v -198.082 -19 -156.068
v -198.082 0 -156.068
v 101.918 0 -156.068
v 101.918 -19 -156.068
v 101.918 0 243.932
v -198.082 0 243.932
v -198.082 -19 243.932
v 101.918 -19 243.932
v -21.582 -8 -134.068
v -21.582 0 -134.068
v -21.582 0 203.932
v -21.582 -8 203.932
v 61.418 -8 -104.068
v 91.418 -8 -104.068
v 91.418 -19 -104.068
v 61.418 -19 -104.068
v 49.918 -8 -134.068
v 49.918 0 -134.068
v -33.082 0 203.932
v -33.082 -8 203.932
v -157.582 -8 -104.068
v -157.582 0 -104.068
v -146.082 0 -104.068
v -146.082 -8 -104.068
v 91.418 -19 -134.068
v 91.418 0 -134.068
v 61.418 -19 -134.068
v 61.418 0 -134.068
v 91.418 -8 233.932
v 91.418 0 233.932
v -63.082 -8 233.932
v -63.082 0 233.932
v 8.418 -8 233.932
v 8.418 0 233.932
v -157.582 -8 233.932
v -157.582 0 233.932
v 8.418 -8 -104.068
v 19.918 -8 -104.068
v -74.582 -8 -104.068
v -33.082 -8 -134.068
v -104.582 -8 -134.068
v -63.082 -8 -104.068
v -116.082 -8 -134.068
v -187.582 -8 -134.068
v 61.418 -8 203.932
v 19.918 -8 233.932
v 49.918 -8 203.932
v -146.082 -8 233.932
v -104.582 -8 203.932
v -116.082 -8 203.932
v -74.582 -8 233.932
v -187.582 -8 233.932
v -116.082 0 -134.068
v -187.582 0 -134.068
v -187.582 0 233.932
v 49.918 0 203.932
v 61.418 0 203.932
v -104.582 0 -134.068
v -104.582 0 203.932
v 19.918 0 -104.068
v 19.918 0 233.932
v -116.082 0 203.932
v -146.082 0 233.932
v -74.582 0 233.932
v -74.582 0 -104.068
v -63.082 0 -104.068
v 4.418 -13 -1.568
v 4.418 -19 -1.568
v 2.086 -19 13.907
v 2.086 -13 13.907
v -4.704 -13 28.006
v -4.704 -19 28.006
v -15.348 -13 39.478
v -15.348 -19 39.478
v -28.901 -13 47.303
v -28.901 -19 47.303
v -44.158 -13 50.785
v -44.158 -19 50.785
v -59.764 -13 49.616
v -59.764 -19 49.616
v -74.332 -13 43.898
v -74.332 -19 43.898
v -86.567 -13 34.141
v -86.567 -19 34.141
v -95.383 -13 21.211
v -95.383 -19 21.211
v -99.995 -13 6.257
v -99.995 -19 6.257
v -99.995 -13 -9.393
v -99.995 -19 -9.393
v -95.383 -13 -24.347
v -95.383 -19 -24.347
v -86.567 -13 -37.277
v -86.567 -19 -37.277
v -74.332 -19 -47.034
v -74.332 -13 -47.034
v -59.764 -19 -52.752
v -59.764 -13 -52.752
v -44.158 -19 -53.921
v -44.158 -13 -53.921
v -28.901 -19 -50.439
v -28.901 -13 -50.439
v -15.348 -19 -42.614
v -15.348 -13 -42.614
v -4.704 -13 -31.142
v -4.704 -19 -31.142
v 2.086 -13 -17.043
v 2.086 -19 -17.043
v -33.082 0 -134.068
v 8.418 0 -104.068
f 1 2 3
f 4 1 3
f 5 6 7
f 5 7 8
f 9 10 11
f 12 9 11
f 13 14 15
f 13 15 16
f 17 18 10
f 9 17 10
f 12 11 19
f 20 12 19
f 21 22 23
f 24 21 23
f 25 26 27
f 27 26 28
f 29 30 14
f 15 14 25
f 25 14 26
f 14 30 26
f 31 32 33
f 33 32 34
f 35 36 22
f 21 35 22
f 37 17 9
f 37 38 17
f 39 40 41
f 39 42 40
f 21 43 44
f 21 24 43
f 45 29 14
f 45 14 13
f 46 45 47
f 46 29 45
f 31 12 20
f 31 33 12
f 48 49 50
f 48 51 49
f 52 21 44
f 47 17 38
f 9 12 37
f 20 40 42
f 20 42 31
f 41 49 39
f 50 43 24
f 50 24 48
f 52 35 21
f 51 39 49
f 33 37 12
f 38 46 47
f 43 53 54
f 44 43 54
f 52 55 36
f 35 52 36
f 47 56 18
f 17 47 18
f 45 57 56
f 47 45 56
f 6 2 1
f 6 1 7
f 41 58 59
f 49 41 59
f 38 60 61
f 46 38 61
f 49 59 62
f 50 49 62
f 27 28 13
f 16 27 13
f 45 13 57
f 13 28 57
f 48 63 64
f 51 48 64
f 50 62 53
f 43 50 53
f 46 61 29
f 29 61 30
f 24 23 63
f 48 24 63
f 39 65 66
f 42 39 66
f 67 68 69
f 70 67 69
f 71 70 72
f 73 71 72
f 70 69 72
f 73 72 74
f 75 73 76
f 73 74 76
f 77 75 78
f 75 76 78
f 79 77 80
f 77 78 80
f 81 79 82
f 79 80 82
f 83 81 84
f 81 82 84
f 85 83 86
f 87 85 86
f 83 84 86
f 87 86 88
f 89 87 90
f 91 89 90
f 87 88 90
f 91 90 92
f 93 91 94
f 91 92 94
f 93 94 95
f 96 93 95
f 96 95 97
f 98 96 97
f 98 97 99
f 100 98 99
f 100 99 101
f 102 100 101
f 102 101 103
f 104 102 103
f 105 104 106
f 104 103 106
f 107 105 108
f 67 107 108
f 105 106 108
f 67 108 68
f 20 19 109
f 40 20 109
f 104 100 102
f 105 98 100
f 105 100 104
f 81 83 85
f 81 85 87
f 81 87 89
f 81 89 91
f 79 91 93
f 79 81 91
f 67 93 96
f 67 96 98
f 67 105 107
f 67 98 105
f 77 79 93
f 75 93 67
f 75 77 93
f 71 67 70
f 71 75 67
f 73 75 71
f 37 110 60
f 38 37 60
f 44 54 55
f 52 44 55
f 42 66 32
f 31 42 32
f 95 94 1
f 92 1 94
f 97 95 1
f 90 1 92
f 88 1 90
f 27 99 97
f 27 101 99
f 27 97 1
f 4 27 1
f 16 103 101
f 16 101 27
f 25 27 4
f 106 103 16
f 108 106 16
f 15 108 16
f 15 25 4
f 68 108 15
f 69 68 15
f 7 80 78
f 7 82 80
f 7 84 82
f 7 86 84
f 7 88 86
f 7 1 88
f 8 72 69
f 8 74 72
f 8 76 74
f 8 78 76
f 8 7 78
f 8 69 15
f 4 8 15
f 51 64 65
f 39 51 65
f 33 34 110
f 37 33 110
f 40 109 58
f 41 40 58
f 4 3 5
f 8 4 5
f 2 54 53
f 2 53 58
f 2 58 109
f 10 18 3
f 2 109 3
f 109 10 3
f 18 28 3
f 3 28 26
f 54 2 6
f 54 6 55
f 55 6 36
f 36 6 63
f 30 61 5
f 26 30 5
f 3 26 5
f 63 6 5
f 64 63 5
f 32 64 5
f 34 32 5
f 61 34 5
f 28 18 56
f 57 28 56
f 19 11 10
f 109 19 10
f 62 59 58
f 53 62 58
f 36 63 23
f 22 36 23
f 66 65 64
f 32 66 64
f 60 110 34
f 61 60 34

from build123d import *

# Parameters (mm, degrees)
F0_W     = 300
F0_H     = 400
F1_DEPTH = 19
F2_R     = 52.5
F3_DEPTH = 6
F5_DEPTH = 8
F6_W     = 30
F6_H     = 30
F7_DEPTH = 11


with BuildPart() as f1:
    # F0 (on Front) → F1 (new body)
    with BuildSketch(Plane.XZ):
        with Locations((-48.081684, 43.9321)):
            Rectangle(F0_W, F0_H)
    extrude(amount=F1_DEPTH)

    # F2 (on face) → F3 (cut)
    with BuildSketch(Plane.XZ.offset(19)):
        with Locations((-48.081684, -1.5679)):
            Circle(F2_R)
    extrude(amount=-F3_DEPTH, mode=Mode.SUBTRACT)

    # F4 (on face) → F5 (cut)
    with BuildSketch(Plane(origin=(0, 0, 0), x_dir=(-1, 0, 0), z_dir=(0, 1, 0))):
        Polygon((-91.418316, 233.9321), (-91.418316, -134.0679), (-61.418316, -134.0679), (-61.418316, 203.9321), (-49.918316, 203.9321), (-49.918316, -134.0679), (21.581684, -134.0679), (21.581684, 203.9321), (33.081684, 203.9321), (33.081684, -134.0679), (104.581684, -134.0679), (104.581684, 203.9321), (116.081684, 203.9321), (116.081684, -134.0679), (187.581684, -134.0679), (187.581684, 233.9321), (157.581684, 233.9321), (157.581684, -104.0679), (146.081684, -104.0679), (146.081684, 233.9321), (74.581684, 233.9321), (74.581684, -104.0679), (63.081684, -104.0679), (63.081684, 233.9321), (-8.418316, 233.9321), (-8.418316, -104.0679), (-19.918316, -104.0679), (-19.918316, 233.9321), align=None)
    extrude(amount=-F5_DEPTH, mode=Mode.SUBTRACT)

    # F6 (on face) → F7 (cut)
    with BuildSketch(Plane(origin=(0, -8, 0), x_dir=(-1, 0, 0), z_dir=(0, 1, 0))):
        with Locations((-76.418316, -119.0679)):
            Rectangle(F6_W, F6_H)
    extrude(amount=-F7_DEPTH, mode=Mode.SUBTRACT)


solid = f1.part
